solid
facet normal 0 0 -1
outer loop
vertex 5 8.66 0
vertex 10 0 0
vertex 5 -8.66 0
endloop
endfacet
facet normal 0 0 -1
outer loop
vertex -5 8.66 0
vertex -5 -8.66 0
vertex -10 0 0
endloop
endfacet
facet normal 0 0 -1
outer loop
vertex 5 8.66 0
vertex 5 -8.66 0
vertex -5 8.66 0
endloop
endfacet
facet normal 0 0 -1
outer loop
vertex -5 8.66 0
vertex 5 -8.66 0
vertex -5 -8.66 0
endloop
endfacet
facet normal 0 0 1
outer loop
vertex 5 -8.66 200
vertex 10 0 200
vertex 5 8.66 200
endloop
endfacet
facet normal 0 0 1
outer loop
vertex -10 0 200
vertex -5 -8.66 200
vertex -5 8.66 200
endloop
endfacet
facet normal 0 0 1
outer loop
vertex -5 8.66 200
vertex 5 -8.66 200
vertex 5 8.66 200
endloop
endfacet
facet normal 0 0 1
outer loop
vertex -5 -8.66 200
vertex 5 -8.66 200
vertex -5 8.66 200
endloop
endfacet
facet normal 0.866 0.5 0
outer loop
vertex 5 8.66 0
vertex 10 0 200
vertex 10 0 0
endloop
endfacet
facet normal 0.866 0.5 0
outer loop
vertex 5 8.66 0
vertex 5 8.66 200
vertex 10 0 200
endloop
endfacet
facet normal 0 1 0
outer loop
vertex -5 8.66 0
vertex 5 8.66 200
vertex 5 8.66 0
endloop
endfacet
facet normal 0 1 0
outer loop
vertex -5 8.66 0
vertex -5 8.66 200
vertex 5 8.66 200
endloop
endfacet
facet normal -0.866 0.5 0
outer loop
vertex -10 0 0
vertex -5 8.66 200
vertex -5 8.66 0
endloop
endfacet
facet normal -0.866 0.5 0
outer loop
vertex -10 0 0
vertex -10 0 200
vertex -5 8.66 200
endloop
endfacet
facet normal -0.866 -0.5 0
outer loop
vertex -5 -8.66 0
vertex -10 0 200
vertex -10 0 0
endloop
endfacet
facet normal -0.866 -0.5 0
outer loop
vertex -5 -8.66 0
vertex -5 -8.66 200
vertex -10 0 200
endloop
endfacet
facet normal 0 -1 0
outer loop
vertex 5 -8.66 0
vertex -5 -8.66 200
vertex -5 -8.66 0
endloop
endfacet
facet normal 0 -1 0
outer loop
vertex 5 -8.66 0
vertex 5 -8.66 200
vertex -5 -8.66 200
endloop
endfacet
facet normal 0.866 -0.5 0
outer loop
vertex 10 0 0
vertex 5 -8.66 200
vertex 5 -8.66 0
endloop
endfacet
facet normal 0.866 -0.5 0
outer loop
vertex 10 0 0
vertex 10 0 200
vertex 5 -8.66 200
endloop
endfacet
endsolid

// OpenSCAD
/*

hex bar
side distance = a

*/
module simple_profile_H(a, length) {
    linear_extrude( height = length ) {
        circle(a/2,$fn=6);
    }
}

simple_profile_H(20, 200);
